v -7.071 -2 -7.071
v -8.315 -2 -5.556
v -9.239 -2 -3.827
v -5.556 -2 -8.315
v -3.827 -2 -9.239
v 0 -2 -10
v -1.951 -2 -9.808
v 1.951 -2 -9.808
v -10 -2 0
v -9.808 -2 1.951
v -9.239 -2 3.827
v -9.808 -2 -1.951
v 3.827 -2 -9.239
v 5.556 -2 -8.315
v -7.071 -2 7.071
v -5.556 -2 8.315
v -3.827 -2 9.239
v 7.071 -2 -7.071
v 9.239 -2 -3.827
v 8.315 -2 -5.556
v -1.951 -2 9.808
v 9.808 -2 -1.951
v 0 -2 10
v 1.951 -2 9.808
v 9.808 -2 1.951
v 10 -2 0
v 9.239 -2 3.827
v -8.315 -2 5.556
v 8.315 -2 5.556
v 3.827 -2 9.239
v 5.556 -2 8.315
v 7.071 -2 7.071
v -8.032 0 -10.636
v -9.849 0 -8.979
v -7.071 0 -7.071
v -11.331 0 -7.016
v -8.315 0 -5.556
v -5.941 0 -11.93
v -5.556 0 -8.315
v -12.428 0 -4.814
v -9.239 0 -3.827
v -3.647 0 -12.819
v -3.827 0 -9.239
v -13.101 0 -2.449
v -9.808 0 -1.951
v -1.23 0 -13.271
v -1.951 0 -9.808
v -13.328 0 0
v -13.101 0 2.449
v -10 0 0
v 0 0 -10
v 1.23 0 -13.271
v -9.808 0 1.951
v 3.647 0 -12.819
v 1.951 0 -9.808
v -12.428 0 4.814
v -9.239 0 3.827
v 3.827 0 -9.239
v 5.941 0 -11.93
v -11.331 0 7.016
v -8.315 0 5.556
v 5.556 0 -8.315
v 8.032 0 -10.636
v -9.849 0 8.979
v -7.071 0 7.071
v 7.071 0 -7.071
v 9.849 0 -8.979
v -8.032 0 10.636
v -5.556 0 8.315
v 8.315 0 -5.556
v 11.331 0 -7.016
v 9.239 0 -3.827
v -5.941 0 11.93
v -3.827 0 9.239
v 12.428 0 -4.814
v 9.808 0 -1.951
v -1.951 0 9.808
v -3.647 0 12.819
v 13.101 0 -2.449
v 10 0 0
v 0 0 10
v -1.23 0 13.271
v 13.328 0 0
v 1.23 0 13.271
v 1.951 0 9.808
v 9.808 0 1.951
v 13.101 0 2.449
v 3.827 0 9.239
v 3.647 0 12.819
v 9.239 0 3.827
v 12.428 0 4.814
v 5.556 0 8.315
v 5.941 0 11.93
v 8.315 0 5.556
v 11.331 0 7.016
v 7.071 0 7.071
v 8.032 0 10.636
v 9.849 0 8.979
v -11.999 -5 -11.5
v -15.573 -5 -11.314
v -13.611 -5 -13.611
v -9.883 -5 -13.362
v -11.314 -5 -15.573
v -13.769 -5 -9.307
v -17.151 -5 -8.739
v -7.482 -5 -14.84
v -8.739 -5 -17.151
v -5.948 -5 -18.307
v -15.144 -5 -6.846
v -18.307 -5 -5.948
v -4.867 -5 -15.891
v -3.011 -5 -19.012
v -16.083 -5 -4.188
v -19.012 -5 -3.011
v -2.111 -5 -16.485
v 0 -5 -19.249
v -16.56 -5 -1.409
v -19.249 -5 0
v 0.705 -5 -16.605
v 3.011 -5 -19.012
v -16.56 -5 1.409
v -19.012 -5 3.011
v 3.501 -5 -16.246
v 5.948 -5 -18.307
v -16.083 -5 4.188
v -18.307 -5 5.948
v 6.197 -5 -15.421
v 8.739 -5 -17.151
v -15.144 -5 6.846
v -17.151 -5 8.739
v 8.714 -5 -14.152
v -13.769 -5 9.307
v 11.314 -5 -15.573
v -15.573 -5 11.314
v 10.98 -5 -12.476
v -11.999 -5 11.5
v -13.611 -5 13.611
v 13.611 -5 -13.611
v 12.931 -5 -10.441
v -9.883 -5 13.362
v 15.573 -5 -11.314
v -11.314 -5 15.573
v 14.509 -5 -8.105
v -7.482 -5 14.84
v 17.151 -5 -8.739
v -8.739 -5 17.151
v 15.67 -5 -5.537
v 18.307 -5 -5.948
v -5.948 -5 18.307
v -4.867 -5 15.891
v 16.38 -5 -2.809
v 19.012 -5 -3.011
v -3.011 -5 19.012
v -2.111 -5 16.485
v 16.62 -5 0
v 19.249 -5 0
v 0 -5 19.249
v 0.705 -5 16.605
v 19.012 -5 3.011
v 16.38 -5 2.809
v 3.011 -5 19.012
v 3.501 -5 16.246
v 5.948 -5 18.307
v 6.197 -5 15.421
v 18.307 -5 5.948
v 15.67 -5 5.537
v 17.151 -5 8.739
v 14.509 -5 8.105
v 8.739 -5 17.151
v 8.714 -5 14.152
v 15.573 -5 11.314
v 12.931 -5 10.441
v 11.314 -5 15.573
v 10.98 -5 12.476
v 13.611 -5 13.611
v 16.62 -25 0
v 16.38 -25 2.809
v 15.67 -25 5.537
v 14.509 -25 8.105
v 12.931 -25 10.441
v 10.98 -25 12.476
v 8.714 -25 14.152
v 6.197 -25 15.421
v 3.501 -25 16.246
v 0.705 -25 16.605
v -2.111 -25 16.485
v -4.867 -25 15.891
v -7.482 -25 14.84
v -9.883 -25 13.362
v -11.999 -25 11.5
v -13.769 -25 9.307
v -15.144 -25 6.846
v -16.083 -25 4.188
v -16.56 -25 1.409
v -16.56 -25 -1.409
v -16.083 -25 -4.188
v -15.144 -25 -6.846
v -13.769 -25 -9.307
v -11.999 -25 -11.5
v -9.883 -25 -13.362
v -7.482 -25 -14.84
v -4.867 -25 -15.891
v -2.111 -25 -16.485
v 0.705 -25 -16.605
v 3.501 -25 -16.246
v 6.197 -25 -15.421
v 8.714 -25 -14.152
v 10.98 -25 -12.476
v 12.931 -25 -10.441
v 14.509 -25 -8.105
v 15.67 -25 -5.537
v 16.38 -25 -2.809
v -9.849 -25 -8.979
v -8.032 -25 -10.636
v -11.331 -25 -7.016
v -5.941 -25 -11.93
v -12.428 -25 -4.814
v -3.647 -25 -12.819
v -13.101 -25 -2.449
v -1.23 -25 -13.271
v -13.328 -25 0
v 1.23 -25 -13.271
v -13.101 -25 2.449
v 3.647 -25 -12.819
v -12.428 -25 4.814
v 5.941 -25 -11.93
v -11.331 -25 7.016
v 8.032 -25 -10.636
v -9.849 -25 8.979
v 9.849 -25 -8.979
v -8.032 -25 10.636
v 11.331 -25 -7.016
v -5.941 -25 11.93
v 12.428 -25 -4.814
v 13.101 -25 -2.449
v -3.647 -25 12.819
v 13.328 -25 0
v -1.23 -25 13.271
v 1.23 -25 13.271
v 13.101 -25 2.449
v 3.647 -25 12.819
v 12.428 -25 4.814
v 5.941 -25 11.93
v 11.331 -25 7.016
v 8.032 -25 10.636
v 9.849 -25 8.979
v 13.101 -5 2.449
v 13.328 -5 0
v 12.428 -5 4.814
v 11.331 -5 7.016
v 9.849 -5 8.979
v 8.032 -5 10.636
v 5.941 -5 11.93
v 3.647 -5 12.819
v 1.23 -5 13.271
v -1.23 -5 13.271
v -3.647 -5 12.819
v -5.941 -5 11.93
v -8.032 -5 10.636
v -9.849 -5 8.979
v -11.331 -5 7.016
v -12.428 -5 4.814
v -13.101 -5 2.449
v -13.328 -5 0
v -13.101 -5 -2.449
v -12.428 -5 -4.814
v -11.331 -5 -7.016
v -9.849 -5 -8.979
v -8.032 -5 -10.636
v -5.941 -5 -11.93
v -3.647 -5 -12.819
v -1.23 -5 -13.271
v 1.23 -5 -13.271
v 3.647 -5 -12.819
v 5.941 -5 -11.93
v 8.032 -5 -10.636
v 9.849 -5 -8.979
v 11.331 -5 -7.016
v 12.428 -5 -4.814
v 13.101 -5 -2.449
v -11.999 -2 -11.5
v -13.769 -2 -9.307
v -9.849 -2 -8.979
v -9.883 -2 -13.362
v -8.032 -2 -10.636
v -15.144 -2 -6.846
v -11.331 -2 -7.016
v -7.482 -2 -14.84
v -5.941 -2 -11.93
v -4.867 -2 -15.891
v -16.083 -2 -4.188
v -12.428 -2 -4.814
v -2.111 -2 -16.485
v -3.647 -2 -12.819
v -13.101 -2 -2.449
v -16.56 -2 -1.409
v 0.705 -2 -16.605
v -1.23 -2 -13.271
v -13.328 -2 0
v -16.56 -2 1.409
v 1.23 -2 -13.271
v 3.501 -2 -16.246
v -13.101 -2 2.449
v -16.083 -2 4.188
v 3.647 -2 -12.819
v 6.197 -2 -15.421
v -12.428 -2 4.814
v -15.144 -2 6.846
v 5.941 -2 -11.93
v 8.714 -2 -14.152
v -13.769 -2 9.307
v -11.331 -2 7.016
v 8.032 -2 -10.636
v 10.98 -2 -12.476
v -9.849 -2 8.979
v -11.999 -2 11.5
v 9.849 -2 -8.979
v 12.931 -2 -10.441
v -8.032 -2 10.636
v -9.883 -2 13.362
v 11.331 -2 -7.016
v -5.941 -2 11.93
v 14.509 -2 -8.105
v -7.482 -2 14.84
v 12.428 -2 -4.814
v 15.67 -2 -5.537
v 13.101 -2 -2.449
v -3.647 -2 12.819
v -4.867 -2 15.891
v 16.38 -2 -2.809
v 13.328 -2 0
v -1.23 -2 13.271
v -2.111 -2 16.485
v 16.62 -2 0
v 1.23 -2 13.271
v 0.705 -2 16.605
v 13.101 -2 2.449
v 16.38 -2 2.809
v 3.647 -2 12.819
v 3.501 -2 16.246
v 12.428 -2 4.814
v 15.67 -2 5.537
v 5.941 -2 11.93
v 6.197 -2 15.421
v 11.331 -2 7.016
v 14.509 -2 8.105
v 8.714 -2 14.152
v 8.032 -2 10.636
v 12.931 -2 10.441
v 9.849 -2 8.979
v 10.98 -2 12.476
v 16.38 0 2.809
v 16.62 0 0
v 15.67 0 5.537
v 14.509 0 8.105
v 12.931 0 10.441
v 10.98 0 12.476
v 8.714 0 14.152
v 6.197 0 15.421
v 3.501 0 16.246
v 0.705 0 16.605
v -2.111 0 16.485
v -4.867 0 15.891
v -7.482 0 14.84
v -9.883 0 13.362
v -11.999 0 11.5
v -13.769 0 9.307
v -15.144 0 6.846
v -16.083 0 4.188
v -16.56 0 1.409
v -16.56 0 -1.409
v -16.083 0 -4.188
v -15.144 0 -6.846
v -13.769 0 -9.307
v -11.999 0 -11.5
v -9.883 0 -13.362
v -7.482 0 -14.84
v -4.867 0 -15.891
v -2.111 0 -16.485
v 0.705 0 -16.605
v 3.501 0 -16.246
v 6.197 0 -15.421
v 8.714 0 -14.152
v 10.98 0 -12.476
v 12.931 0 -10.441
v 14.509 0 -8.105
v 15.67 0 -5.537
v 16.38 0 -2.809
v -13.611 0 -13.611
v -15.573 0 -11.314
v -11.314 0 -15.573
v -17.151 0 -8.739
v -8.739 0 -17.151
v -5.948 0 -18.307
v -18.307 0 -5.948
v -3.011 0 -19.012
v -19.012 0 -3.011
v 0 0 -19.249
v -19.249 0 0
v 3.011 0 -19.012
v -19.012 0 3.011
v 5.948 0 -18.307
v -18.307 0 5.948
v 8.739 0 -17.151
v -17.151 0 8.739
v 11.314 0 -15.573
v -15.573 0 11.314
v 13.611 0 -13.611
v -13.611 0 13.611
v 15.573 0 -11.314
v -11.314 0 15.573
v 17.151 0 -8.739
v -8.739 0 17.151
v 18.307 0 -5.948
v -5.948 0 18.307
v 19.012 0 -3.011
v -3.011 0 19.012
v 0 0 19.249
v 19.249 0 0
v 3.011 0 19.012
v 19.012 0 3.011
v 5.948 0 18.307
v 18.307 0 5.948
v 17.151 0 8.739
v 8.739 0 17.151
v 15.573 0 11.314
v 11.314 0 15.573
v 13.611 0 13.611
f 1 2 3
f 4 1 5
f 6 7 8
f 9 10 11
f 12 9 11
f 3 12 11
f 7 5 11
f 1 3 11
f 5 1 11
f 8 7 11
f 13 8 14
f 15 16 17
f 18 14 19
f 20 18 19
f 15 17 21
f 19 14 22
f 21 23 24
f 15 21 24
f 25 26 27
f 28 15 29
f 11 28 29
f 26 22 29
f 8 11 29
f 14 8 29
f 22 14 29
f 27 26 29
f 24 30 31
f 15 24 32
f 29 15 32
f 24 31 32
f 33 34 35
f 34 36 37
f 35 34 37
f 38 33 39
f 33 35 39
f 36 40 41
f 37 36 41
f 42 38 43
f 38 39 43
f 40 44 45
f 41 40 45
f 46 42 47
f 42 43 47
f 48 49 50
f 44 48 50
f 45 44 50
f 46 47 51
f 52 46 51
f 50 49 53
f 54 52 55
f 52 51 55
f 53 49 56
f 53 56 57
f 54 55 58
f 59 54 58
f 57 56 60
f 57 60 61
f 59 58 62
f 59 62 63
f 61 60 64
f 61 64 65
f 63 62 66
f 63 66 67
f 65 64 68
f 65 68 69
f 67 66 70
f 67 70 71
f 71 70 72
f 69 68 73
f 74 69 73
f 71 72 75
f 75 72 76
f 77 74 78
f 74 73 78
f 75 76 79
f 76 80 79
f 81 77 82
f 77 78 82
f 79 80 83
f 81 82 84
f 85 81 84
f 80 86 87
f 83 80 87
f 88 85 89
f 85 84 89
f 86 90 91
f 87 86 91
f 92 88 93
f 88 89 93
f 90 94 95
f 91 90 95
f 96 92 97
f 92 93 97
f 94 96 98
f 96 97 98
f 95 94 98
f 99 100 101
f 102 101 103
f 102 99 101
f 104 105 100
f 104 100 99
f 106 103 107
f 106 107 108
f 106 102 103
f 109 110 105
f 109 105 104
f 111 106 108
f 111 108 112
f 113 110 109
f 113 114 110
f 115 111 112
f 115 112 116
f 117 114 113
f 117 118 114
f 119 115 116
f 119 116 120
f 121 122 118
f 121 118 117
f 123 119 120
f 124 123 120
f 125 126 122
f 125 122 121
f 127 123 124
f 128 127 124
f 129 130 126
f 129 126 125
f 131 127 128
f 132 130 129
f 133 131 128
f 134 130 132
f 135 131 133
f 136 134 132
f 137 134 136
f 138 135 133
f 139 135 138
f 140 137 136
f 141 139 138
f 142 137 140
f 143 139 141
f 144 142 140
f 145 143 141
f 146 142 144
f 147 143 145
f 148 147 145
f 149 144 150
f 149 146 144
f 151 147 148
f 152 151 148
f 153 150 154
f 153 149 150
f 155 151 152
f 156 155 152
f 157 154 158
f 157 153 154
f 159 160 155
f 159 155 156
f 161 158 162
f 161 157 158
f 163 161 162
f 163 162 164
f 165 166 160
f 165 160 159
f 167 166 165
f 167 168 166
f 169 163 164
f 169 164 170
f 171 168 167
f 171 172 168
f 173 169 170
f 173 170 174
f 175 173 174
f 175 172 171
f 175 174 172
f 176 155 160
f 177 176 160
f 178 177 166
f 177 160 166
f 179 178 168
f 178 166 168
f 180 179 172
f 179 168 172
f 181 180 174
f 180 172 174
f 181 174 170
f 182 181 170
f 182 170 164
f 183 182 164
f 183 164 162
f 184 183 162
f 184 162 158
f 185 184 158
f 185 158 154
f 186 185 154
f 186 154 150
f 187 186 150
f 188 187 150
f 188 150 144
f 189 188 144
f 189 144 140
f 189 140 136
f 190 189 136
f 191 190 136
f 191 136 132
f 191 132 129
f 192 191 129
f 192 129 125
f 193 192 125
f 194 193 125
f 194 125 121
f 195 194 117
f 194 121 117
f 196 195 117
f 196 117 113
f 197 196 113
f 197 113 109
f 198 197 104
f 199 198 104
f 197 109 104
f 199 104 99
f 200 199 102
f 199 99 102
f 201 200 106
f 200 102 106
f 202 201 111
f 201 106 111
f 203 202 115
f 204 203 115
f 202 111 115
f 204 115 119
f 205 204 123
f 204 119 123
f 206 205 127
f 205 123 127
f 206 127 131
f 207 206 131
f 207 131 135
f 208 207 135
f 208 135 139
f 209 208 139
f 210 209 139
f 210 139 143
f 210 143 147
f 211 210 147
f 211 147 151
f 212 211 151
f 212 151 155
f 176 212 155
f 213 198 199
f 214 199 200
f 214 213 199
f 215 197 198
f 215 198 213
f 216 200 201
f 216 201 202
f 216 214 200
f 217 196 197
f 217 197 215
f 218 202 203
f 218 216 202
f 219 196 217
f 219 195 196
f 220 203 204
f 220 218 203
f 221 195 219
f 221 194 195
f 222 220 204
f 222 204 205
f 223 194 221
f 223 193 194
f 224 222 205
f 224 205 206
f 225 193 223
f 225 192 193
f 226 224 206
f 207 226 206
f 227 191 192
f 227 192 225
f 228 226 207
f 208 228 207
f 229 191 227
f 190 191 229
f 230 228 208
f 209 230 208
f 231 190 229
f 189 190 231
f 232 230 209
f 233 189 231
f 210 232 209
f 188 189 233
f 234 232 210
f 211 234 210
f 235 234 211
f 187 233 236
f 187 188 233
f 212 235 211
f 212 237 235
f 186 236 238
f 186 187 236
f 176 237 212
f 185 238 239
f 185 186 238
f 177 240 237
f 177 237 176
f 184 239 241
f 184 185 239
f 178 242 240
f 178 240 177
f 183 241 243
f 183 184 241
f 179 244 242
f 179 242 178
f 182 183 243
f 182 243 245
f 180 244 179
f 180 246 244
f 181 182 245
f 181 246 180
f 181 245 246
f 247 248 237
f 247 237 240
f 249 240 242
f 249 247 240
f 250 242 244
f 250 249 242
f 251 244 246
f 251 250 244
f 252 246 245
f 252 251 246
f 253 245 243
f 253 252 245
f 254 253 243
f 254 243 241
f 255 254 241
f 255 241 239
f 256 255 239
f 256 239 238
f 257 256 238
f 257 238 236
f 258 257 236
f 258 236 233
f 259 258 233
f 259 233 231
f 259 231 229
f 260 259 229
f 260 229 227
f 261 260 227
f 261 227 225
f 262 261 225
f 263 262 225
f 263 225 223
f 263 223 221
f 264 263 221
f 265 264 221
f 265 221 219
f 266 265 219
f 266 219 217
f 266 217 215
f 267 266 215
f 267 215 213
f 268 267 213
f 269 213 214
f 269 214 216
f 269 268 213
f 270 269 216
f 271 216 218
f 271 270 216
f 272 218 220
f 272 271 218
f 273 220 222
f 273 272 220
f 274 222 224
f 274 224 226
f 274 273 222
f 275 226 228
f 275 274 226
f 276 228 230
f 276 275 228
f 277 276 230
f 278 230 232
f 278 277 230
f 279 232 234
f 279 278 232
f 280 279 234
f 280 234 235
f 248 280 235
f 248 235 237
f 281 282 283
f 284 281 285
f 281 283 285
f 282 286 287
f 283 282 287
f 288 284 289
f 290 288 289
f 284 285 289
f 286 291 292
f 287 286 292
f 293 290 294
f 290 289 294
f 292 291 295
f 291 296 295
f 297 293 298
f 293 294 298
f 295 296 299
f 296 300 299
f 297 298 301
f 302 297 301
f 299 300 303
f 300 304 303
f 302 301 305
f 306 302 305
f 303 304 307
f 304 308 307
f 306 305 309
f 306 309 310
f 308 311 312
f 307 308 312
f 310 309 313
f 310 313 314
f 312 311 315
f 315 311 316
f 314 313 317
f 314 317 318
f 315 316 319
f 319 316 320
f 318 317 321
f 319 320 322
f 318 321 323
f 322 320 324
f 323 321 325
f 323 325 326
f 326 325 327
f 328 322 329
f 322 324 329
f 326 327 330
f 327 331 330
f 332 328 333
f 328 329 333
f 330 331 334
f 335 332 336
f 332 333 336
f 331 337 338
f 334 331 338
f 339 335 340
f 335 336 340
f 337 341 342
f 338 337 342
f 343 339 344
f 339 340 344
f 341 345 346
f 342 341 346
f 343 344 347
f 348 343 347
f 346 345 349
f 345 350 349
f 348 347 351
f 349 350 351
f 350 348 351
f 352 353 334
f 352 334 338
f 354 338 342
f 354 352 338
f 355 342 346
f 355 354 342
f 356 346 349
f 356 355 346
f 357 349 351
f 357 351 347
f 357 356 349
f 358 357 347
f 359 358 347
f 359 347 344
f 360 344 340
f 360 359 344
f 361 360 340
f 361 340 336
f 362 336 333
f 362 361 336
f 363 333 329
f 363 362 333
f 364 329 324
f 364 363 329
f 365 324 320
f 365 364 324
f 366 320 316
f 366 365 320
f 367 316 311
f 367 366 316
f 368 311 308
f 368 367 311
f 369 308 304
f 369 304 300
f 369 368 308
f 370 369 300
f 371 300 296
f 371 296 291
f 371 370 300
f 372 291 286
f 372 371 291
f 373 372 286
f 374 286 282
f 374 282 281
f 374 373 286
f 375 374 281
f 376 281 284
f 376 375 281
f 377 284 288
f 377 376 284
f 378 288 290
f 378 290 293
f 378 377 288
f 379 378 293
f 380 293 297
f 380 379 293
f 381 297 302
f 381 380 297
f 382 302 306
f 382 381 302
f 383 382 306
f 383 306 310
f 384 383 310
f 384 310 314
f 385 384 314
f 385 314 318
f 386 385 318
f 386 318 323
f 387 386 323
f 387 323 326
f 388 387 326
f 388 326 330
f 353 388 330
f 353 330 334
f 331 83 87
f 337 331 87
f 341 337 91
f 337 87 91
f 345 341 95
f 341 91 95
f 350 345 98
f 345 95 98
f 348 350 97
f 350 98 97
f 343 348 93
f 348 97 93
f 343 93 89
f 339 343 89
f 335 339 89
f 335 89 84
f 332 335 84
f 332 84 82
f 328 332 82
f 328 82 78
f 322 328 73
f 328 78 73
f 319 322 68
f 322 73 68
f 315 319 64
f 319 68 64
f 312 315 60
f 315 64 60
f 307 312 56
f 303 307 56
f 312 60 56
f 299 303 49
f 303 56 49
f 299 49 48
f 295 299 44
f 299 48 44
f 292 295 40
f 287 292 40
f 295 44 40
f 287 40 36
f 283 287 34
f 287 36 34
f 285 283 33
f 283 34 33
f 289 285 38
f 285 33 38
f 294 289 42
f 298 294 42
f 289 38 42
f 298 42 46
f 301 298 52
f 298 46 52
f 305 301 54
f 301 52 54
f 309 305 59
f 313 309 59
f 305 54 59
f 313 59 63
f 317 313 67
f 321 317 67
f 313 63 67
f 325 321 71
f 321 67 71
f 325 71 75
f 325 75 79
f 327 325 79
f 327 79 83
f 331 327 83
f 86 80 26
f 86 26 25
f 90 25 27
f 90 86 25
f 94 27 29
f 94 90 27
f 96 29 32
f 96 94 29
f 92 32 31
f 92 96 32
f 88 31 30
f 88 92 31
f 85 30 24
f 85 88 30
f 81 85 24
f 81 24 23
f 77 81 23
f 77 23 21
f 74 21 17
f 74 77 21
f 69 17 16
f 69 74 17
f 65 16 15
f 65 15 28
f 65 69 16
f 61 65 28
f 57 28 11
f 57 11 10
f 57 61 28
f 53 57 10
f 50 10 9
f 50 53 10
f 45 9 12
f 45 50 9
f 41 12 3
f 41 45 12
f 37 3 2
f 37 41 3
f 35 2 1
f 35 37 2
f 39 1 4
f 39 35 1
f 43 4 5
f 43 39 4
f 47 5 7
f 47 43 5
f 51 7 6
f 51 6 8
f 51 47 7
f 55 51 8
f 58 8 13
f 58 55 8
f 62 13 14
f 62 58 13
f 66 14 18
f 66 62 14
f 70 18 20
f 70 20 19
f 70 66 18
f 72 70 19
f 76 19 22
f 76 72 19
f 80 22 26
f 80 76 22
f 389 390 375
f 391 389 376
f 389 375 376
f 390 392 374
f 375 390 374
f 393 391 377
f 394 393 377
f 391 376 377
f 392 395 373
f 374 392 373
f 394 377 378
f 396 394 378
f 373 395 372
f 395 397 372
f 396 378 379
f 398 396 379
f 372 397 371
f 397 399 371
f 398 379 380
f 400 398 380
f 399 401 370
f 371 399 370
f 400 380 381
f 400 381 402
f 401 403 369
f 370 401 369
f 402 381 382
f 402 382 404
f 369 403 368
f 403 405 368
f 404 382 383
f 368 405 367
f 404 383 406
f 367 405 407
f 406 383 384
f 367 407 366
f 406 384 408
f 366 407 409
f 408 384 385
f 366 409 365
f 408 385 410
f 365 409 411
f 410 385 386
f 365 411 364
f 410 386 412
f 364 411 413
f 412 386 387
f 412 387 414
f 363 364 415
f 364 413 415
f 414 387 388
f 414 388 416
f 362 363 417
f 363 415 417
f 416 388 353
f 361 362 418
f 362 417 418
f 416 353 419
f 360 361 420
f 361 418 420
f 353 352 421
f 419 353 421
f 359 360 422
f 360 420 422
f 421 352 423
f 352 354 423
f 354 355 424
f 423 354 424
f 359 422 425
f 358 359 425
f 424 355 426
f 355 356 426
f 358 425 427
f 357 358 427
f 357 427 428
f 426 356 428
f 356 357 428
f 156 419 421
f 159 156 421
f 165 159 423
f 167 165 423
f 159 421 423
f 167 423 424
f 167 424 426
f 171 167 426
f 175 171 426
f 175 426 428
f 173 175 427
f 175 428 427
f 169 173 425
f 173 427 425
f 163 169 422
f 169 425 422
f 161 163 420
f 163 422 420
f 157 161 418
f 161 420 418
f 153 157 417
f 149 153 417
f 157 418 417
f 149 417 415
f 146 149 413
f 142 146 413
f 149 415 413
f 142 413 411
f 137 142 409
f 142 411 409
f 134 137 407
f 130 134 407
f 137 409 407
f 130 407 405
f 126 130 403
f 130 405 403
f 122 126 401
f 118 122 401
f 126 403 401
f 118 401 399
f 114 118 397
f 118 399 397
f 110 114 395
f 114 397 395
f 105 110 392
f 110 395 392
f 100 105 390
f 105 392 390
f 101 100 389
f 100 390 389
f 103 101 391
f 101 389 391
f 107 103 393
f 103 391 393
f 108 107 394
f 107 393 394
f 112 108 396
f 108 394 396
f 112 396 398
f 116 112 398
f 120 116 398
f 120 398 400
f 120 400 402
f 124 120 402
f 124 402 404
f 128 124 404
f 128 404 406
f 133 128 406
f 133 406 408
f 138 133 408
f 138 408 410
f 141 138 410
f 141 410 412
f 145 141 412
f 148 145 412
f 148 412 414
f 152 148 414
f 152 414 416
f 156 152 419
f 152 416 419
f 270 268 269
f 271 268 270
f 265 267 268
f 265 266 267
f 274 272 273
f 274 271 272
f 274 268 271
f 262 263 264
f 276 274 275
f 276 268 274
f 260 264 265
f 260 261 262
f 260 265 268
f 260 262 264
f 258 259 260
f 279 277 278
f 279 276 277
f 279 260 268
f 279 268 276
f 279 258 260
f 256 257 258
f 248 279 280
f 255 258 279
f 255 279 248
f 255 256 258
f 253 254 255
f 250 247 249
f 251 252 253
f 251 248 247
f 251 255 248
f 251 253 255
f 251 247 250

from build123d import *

# Parameters (mm, degrees)
F0_R     = 19.248811
F2_DEPTH = 5
F1_R     = 10
F3_DEPTH = 2
F1_R_2   = 16.619504
F1_R_3   = 13.327502
F4_DEPTH = 25
F5_DEPTH = 2


with BuildPart() as f2:
    # F0 (on Front) → F2 (new body)
    with BuildSketch(Plane.XZ):
        Circle(F0_R)
    extrude(amount=F2_DEPTH)

    # F1 (on Front) → F3 (cut)
    with BuildSketch(Plane.XZ):
        Circle(F1_R)
    extrude(amount=F3_DEPTH, mode=Mode.SUBTRACT)

    # F1 (on Front) → F4 (join)
    with BuildSketch(Plane.XZ):
        Circle(F1_R_2)
        Circle(F1_R_3, mode=Mode.SUBTRACT)
    extrude(amount=F4_DEPTH)

    # F1 (on Front) → F5 (cut)
    with BuildSketch(Plane.XZ):
        Circle(F1_R_2)
        Circle(F1_R_3, mode=Mode.SUBTRACT)
    extrude(amount=F5_DEPTH, mode=Mode.SUBTRACT)


solid = f2.part
